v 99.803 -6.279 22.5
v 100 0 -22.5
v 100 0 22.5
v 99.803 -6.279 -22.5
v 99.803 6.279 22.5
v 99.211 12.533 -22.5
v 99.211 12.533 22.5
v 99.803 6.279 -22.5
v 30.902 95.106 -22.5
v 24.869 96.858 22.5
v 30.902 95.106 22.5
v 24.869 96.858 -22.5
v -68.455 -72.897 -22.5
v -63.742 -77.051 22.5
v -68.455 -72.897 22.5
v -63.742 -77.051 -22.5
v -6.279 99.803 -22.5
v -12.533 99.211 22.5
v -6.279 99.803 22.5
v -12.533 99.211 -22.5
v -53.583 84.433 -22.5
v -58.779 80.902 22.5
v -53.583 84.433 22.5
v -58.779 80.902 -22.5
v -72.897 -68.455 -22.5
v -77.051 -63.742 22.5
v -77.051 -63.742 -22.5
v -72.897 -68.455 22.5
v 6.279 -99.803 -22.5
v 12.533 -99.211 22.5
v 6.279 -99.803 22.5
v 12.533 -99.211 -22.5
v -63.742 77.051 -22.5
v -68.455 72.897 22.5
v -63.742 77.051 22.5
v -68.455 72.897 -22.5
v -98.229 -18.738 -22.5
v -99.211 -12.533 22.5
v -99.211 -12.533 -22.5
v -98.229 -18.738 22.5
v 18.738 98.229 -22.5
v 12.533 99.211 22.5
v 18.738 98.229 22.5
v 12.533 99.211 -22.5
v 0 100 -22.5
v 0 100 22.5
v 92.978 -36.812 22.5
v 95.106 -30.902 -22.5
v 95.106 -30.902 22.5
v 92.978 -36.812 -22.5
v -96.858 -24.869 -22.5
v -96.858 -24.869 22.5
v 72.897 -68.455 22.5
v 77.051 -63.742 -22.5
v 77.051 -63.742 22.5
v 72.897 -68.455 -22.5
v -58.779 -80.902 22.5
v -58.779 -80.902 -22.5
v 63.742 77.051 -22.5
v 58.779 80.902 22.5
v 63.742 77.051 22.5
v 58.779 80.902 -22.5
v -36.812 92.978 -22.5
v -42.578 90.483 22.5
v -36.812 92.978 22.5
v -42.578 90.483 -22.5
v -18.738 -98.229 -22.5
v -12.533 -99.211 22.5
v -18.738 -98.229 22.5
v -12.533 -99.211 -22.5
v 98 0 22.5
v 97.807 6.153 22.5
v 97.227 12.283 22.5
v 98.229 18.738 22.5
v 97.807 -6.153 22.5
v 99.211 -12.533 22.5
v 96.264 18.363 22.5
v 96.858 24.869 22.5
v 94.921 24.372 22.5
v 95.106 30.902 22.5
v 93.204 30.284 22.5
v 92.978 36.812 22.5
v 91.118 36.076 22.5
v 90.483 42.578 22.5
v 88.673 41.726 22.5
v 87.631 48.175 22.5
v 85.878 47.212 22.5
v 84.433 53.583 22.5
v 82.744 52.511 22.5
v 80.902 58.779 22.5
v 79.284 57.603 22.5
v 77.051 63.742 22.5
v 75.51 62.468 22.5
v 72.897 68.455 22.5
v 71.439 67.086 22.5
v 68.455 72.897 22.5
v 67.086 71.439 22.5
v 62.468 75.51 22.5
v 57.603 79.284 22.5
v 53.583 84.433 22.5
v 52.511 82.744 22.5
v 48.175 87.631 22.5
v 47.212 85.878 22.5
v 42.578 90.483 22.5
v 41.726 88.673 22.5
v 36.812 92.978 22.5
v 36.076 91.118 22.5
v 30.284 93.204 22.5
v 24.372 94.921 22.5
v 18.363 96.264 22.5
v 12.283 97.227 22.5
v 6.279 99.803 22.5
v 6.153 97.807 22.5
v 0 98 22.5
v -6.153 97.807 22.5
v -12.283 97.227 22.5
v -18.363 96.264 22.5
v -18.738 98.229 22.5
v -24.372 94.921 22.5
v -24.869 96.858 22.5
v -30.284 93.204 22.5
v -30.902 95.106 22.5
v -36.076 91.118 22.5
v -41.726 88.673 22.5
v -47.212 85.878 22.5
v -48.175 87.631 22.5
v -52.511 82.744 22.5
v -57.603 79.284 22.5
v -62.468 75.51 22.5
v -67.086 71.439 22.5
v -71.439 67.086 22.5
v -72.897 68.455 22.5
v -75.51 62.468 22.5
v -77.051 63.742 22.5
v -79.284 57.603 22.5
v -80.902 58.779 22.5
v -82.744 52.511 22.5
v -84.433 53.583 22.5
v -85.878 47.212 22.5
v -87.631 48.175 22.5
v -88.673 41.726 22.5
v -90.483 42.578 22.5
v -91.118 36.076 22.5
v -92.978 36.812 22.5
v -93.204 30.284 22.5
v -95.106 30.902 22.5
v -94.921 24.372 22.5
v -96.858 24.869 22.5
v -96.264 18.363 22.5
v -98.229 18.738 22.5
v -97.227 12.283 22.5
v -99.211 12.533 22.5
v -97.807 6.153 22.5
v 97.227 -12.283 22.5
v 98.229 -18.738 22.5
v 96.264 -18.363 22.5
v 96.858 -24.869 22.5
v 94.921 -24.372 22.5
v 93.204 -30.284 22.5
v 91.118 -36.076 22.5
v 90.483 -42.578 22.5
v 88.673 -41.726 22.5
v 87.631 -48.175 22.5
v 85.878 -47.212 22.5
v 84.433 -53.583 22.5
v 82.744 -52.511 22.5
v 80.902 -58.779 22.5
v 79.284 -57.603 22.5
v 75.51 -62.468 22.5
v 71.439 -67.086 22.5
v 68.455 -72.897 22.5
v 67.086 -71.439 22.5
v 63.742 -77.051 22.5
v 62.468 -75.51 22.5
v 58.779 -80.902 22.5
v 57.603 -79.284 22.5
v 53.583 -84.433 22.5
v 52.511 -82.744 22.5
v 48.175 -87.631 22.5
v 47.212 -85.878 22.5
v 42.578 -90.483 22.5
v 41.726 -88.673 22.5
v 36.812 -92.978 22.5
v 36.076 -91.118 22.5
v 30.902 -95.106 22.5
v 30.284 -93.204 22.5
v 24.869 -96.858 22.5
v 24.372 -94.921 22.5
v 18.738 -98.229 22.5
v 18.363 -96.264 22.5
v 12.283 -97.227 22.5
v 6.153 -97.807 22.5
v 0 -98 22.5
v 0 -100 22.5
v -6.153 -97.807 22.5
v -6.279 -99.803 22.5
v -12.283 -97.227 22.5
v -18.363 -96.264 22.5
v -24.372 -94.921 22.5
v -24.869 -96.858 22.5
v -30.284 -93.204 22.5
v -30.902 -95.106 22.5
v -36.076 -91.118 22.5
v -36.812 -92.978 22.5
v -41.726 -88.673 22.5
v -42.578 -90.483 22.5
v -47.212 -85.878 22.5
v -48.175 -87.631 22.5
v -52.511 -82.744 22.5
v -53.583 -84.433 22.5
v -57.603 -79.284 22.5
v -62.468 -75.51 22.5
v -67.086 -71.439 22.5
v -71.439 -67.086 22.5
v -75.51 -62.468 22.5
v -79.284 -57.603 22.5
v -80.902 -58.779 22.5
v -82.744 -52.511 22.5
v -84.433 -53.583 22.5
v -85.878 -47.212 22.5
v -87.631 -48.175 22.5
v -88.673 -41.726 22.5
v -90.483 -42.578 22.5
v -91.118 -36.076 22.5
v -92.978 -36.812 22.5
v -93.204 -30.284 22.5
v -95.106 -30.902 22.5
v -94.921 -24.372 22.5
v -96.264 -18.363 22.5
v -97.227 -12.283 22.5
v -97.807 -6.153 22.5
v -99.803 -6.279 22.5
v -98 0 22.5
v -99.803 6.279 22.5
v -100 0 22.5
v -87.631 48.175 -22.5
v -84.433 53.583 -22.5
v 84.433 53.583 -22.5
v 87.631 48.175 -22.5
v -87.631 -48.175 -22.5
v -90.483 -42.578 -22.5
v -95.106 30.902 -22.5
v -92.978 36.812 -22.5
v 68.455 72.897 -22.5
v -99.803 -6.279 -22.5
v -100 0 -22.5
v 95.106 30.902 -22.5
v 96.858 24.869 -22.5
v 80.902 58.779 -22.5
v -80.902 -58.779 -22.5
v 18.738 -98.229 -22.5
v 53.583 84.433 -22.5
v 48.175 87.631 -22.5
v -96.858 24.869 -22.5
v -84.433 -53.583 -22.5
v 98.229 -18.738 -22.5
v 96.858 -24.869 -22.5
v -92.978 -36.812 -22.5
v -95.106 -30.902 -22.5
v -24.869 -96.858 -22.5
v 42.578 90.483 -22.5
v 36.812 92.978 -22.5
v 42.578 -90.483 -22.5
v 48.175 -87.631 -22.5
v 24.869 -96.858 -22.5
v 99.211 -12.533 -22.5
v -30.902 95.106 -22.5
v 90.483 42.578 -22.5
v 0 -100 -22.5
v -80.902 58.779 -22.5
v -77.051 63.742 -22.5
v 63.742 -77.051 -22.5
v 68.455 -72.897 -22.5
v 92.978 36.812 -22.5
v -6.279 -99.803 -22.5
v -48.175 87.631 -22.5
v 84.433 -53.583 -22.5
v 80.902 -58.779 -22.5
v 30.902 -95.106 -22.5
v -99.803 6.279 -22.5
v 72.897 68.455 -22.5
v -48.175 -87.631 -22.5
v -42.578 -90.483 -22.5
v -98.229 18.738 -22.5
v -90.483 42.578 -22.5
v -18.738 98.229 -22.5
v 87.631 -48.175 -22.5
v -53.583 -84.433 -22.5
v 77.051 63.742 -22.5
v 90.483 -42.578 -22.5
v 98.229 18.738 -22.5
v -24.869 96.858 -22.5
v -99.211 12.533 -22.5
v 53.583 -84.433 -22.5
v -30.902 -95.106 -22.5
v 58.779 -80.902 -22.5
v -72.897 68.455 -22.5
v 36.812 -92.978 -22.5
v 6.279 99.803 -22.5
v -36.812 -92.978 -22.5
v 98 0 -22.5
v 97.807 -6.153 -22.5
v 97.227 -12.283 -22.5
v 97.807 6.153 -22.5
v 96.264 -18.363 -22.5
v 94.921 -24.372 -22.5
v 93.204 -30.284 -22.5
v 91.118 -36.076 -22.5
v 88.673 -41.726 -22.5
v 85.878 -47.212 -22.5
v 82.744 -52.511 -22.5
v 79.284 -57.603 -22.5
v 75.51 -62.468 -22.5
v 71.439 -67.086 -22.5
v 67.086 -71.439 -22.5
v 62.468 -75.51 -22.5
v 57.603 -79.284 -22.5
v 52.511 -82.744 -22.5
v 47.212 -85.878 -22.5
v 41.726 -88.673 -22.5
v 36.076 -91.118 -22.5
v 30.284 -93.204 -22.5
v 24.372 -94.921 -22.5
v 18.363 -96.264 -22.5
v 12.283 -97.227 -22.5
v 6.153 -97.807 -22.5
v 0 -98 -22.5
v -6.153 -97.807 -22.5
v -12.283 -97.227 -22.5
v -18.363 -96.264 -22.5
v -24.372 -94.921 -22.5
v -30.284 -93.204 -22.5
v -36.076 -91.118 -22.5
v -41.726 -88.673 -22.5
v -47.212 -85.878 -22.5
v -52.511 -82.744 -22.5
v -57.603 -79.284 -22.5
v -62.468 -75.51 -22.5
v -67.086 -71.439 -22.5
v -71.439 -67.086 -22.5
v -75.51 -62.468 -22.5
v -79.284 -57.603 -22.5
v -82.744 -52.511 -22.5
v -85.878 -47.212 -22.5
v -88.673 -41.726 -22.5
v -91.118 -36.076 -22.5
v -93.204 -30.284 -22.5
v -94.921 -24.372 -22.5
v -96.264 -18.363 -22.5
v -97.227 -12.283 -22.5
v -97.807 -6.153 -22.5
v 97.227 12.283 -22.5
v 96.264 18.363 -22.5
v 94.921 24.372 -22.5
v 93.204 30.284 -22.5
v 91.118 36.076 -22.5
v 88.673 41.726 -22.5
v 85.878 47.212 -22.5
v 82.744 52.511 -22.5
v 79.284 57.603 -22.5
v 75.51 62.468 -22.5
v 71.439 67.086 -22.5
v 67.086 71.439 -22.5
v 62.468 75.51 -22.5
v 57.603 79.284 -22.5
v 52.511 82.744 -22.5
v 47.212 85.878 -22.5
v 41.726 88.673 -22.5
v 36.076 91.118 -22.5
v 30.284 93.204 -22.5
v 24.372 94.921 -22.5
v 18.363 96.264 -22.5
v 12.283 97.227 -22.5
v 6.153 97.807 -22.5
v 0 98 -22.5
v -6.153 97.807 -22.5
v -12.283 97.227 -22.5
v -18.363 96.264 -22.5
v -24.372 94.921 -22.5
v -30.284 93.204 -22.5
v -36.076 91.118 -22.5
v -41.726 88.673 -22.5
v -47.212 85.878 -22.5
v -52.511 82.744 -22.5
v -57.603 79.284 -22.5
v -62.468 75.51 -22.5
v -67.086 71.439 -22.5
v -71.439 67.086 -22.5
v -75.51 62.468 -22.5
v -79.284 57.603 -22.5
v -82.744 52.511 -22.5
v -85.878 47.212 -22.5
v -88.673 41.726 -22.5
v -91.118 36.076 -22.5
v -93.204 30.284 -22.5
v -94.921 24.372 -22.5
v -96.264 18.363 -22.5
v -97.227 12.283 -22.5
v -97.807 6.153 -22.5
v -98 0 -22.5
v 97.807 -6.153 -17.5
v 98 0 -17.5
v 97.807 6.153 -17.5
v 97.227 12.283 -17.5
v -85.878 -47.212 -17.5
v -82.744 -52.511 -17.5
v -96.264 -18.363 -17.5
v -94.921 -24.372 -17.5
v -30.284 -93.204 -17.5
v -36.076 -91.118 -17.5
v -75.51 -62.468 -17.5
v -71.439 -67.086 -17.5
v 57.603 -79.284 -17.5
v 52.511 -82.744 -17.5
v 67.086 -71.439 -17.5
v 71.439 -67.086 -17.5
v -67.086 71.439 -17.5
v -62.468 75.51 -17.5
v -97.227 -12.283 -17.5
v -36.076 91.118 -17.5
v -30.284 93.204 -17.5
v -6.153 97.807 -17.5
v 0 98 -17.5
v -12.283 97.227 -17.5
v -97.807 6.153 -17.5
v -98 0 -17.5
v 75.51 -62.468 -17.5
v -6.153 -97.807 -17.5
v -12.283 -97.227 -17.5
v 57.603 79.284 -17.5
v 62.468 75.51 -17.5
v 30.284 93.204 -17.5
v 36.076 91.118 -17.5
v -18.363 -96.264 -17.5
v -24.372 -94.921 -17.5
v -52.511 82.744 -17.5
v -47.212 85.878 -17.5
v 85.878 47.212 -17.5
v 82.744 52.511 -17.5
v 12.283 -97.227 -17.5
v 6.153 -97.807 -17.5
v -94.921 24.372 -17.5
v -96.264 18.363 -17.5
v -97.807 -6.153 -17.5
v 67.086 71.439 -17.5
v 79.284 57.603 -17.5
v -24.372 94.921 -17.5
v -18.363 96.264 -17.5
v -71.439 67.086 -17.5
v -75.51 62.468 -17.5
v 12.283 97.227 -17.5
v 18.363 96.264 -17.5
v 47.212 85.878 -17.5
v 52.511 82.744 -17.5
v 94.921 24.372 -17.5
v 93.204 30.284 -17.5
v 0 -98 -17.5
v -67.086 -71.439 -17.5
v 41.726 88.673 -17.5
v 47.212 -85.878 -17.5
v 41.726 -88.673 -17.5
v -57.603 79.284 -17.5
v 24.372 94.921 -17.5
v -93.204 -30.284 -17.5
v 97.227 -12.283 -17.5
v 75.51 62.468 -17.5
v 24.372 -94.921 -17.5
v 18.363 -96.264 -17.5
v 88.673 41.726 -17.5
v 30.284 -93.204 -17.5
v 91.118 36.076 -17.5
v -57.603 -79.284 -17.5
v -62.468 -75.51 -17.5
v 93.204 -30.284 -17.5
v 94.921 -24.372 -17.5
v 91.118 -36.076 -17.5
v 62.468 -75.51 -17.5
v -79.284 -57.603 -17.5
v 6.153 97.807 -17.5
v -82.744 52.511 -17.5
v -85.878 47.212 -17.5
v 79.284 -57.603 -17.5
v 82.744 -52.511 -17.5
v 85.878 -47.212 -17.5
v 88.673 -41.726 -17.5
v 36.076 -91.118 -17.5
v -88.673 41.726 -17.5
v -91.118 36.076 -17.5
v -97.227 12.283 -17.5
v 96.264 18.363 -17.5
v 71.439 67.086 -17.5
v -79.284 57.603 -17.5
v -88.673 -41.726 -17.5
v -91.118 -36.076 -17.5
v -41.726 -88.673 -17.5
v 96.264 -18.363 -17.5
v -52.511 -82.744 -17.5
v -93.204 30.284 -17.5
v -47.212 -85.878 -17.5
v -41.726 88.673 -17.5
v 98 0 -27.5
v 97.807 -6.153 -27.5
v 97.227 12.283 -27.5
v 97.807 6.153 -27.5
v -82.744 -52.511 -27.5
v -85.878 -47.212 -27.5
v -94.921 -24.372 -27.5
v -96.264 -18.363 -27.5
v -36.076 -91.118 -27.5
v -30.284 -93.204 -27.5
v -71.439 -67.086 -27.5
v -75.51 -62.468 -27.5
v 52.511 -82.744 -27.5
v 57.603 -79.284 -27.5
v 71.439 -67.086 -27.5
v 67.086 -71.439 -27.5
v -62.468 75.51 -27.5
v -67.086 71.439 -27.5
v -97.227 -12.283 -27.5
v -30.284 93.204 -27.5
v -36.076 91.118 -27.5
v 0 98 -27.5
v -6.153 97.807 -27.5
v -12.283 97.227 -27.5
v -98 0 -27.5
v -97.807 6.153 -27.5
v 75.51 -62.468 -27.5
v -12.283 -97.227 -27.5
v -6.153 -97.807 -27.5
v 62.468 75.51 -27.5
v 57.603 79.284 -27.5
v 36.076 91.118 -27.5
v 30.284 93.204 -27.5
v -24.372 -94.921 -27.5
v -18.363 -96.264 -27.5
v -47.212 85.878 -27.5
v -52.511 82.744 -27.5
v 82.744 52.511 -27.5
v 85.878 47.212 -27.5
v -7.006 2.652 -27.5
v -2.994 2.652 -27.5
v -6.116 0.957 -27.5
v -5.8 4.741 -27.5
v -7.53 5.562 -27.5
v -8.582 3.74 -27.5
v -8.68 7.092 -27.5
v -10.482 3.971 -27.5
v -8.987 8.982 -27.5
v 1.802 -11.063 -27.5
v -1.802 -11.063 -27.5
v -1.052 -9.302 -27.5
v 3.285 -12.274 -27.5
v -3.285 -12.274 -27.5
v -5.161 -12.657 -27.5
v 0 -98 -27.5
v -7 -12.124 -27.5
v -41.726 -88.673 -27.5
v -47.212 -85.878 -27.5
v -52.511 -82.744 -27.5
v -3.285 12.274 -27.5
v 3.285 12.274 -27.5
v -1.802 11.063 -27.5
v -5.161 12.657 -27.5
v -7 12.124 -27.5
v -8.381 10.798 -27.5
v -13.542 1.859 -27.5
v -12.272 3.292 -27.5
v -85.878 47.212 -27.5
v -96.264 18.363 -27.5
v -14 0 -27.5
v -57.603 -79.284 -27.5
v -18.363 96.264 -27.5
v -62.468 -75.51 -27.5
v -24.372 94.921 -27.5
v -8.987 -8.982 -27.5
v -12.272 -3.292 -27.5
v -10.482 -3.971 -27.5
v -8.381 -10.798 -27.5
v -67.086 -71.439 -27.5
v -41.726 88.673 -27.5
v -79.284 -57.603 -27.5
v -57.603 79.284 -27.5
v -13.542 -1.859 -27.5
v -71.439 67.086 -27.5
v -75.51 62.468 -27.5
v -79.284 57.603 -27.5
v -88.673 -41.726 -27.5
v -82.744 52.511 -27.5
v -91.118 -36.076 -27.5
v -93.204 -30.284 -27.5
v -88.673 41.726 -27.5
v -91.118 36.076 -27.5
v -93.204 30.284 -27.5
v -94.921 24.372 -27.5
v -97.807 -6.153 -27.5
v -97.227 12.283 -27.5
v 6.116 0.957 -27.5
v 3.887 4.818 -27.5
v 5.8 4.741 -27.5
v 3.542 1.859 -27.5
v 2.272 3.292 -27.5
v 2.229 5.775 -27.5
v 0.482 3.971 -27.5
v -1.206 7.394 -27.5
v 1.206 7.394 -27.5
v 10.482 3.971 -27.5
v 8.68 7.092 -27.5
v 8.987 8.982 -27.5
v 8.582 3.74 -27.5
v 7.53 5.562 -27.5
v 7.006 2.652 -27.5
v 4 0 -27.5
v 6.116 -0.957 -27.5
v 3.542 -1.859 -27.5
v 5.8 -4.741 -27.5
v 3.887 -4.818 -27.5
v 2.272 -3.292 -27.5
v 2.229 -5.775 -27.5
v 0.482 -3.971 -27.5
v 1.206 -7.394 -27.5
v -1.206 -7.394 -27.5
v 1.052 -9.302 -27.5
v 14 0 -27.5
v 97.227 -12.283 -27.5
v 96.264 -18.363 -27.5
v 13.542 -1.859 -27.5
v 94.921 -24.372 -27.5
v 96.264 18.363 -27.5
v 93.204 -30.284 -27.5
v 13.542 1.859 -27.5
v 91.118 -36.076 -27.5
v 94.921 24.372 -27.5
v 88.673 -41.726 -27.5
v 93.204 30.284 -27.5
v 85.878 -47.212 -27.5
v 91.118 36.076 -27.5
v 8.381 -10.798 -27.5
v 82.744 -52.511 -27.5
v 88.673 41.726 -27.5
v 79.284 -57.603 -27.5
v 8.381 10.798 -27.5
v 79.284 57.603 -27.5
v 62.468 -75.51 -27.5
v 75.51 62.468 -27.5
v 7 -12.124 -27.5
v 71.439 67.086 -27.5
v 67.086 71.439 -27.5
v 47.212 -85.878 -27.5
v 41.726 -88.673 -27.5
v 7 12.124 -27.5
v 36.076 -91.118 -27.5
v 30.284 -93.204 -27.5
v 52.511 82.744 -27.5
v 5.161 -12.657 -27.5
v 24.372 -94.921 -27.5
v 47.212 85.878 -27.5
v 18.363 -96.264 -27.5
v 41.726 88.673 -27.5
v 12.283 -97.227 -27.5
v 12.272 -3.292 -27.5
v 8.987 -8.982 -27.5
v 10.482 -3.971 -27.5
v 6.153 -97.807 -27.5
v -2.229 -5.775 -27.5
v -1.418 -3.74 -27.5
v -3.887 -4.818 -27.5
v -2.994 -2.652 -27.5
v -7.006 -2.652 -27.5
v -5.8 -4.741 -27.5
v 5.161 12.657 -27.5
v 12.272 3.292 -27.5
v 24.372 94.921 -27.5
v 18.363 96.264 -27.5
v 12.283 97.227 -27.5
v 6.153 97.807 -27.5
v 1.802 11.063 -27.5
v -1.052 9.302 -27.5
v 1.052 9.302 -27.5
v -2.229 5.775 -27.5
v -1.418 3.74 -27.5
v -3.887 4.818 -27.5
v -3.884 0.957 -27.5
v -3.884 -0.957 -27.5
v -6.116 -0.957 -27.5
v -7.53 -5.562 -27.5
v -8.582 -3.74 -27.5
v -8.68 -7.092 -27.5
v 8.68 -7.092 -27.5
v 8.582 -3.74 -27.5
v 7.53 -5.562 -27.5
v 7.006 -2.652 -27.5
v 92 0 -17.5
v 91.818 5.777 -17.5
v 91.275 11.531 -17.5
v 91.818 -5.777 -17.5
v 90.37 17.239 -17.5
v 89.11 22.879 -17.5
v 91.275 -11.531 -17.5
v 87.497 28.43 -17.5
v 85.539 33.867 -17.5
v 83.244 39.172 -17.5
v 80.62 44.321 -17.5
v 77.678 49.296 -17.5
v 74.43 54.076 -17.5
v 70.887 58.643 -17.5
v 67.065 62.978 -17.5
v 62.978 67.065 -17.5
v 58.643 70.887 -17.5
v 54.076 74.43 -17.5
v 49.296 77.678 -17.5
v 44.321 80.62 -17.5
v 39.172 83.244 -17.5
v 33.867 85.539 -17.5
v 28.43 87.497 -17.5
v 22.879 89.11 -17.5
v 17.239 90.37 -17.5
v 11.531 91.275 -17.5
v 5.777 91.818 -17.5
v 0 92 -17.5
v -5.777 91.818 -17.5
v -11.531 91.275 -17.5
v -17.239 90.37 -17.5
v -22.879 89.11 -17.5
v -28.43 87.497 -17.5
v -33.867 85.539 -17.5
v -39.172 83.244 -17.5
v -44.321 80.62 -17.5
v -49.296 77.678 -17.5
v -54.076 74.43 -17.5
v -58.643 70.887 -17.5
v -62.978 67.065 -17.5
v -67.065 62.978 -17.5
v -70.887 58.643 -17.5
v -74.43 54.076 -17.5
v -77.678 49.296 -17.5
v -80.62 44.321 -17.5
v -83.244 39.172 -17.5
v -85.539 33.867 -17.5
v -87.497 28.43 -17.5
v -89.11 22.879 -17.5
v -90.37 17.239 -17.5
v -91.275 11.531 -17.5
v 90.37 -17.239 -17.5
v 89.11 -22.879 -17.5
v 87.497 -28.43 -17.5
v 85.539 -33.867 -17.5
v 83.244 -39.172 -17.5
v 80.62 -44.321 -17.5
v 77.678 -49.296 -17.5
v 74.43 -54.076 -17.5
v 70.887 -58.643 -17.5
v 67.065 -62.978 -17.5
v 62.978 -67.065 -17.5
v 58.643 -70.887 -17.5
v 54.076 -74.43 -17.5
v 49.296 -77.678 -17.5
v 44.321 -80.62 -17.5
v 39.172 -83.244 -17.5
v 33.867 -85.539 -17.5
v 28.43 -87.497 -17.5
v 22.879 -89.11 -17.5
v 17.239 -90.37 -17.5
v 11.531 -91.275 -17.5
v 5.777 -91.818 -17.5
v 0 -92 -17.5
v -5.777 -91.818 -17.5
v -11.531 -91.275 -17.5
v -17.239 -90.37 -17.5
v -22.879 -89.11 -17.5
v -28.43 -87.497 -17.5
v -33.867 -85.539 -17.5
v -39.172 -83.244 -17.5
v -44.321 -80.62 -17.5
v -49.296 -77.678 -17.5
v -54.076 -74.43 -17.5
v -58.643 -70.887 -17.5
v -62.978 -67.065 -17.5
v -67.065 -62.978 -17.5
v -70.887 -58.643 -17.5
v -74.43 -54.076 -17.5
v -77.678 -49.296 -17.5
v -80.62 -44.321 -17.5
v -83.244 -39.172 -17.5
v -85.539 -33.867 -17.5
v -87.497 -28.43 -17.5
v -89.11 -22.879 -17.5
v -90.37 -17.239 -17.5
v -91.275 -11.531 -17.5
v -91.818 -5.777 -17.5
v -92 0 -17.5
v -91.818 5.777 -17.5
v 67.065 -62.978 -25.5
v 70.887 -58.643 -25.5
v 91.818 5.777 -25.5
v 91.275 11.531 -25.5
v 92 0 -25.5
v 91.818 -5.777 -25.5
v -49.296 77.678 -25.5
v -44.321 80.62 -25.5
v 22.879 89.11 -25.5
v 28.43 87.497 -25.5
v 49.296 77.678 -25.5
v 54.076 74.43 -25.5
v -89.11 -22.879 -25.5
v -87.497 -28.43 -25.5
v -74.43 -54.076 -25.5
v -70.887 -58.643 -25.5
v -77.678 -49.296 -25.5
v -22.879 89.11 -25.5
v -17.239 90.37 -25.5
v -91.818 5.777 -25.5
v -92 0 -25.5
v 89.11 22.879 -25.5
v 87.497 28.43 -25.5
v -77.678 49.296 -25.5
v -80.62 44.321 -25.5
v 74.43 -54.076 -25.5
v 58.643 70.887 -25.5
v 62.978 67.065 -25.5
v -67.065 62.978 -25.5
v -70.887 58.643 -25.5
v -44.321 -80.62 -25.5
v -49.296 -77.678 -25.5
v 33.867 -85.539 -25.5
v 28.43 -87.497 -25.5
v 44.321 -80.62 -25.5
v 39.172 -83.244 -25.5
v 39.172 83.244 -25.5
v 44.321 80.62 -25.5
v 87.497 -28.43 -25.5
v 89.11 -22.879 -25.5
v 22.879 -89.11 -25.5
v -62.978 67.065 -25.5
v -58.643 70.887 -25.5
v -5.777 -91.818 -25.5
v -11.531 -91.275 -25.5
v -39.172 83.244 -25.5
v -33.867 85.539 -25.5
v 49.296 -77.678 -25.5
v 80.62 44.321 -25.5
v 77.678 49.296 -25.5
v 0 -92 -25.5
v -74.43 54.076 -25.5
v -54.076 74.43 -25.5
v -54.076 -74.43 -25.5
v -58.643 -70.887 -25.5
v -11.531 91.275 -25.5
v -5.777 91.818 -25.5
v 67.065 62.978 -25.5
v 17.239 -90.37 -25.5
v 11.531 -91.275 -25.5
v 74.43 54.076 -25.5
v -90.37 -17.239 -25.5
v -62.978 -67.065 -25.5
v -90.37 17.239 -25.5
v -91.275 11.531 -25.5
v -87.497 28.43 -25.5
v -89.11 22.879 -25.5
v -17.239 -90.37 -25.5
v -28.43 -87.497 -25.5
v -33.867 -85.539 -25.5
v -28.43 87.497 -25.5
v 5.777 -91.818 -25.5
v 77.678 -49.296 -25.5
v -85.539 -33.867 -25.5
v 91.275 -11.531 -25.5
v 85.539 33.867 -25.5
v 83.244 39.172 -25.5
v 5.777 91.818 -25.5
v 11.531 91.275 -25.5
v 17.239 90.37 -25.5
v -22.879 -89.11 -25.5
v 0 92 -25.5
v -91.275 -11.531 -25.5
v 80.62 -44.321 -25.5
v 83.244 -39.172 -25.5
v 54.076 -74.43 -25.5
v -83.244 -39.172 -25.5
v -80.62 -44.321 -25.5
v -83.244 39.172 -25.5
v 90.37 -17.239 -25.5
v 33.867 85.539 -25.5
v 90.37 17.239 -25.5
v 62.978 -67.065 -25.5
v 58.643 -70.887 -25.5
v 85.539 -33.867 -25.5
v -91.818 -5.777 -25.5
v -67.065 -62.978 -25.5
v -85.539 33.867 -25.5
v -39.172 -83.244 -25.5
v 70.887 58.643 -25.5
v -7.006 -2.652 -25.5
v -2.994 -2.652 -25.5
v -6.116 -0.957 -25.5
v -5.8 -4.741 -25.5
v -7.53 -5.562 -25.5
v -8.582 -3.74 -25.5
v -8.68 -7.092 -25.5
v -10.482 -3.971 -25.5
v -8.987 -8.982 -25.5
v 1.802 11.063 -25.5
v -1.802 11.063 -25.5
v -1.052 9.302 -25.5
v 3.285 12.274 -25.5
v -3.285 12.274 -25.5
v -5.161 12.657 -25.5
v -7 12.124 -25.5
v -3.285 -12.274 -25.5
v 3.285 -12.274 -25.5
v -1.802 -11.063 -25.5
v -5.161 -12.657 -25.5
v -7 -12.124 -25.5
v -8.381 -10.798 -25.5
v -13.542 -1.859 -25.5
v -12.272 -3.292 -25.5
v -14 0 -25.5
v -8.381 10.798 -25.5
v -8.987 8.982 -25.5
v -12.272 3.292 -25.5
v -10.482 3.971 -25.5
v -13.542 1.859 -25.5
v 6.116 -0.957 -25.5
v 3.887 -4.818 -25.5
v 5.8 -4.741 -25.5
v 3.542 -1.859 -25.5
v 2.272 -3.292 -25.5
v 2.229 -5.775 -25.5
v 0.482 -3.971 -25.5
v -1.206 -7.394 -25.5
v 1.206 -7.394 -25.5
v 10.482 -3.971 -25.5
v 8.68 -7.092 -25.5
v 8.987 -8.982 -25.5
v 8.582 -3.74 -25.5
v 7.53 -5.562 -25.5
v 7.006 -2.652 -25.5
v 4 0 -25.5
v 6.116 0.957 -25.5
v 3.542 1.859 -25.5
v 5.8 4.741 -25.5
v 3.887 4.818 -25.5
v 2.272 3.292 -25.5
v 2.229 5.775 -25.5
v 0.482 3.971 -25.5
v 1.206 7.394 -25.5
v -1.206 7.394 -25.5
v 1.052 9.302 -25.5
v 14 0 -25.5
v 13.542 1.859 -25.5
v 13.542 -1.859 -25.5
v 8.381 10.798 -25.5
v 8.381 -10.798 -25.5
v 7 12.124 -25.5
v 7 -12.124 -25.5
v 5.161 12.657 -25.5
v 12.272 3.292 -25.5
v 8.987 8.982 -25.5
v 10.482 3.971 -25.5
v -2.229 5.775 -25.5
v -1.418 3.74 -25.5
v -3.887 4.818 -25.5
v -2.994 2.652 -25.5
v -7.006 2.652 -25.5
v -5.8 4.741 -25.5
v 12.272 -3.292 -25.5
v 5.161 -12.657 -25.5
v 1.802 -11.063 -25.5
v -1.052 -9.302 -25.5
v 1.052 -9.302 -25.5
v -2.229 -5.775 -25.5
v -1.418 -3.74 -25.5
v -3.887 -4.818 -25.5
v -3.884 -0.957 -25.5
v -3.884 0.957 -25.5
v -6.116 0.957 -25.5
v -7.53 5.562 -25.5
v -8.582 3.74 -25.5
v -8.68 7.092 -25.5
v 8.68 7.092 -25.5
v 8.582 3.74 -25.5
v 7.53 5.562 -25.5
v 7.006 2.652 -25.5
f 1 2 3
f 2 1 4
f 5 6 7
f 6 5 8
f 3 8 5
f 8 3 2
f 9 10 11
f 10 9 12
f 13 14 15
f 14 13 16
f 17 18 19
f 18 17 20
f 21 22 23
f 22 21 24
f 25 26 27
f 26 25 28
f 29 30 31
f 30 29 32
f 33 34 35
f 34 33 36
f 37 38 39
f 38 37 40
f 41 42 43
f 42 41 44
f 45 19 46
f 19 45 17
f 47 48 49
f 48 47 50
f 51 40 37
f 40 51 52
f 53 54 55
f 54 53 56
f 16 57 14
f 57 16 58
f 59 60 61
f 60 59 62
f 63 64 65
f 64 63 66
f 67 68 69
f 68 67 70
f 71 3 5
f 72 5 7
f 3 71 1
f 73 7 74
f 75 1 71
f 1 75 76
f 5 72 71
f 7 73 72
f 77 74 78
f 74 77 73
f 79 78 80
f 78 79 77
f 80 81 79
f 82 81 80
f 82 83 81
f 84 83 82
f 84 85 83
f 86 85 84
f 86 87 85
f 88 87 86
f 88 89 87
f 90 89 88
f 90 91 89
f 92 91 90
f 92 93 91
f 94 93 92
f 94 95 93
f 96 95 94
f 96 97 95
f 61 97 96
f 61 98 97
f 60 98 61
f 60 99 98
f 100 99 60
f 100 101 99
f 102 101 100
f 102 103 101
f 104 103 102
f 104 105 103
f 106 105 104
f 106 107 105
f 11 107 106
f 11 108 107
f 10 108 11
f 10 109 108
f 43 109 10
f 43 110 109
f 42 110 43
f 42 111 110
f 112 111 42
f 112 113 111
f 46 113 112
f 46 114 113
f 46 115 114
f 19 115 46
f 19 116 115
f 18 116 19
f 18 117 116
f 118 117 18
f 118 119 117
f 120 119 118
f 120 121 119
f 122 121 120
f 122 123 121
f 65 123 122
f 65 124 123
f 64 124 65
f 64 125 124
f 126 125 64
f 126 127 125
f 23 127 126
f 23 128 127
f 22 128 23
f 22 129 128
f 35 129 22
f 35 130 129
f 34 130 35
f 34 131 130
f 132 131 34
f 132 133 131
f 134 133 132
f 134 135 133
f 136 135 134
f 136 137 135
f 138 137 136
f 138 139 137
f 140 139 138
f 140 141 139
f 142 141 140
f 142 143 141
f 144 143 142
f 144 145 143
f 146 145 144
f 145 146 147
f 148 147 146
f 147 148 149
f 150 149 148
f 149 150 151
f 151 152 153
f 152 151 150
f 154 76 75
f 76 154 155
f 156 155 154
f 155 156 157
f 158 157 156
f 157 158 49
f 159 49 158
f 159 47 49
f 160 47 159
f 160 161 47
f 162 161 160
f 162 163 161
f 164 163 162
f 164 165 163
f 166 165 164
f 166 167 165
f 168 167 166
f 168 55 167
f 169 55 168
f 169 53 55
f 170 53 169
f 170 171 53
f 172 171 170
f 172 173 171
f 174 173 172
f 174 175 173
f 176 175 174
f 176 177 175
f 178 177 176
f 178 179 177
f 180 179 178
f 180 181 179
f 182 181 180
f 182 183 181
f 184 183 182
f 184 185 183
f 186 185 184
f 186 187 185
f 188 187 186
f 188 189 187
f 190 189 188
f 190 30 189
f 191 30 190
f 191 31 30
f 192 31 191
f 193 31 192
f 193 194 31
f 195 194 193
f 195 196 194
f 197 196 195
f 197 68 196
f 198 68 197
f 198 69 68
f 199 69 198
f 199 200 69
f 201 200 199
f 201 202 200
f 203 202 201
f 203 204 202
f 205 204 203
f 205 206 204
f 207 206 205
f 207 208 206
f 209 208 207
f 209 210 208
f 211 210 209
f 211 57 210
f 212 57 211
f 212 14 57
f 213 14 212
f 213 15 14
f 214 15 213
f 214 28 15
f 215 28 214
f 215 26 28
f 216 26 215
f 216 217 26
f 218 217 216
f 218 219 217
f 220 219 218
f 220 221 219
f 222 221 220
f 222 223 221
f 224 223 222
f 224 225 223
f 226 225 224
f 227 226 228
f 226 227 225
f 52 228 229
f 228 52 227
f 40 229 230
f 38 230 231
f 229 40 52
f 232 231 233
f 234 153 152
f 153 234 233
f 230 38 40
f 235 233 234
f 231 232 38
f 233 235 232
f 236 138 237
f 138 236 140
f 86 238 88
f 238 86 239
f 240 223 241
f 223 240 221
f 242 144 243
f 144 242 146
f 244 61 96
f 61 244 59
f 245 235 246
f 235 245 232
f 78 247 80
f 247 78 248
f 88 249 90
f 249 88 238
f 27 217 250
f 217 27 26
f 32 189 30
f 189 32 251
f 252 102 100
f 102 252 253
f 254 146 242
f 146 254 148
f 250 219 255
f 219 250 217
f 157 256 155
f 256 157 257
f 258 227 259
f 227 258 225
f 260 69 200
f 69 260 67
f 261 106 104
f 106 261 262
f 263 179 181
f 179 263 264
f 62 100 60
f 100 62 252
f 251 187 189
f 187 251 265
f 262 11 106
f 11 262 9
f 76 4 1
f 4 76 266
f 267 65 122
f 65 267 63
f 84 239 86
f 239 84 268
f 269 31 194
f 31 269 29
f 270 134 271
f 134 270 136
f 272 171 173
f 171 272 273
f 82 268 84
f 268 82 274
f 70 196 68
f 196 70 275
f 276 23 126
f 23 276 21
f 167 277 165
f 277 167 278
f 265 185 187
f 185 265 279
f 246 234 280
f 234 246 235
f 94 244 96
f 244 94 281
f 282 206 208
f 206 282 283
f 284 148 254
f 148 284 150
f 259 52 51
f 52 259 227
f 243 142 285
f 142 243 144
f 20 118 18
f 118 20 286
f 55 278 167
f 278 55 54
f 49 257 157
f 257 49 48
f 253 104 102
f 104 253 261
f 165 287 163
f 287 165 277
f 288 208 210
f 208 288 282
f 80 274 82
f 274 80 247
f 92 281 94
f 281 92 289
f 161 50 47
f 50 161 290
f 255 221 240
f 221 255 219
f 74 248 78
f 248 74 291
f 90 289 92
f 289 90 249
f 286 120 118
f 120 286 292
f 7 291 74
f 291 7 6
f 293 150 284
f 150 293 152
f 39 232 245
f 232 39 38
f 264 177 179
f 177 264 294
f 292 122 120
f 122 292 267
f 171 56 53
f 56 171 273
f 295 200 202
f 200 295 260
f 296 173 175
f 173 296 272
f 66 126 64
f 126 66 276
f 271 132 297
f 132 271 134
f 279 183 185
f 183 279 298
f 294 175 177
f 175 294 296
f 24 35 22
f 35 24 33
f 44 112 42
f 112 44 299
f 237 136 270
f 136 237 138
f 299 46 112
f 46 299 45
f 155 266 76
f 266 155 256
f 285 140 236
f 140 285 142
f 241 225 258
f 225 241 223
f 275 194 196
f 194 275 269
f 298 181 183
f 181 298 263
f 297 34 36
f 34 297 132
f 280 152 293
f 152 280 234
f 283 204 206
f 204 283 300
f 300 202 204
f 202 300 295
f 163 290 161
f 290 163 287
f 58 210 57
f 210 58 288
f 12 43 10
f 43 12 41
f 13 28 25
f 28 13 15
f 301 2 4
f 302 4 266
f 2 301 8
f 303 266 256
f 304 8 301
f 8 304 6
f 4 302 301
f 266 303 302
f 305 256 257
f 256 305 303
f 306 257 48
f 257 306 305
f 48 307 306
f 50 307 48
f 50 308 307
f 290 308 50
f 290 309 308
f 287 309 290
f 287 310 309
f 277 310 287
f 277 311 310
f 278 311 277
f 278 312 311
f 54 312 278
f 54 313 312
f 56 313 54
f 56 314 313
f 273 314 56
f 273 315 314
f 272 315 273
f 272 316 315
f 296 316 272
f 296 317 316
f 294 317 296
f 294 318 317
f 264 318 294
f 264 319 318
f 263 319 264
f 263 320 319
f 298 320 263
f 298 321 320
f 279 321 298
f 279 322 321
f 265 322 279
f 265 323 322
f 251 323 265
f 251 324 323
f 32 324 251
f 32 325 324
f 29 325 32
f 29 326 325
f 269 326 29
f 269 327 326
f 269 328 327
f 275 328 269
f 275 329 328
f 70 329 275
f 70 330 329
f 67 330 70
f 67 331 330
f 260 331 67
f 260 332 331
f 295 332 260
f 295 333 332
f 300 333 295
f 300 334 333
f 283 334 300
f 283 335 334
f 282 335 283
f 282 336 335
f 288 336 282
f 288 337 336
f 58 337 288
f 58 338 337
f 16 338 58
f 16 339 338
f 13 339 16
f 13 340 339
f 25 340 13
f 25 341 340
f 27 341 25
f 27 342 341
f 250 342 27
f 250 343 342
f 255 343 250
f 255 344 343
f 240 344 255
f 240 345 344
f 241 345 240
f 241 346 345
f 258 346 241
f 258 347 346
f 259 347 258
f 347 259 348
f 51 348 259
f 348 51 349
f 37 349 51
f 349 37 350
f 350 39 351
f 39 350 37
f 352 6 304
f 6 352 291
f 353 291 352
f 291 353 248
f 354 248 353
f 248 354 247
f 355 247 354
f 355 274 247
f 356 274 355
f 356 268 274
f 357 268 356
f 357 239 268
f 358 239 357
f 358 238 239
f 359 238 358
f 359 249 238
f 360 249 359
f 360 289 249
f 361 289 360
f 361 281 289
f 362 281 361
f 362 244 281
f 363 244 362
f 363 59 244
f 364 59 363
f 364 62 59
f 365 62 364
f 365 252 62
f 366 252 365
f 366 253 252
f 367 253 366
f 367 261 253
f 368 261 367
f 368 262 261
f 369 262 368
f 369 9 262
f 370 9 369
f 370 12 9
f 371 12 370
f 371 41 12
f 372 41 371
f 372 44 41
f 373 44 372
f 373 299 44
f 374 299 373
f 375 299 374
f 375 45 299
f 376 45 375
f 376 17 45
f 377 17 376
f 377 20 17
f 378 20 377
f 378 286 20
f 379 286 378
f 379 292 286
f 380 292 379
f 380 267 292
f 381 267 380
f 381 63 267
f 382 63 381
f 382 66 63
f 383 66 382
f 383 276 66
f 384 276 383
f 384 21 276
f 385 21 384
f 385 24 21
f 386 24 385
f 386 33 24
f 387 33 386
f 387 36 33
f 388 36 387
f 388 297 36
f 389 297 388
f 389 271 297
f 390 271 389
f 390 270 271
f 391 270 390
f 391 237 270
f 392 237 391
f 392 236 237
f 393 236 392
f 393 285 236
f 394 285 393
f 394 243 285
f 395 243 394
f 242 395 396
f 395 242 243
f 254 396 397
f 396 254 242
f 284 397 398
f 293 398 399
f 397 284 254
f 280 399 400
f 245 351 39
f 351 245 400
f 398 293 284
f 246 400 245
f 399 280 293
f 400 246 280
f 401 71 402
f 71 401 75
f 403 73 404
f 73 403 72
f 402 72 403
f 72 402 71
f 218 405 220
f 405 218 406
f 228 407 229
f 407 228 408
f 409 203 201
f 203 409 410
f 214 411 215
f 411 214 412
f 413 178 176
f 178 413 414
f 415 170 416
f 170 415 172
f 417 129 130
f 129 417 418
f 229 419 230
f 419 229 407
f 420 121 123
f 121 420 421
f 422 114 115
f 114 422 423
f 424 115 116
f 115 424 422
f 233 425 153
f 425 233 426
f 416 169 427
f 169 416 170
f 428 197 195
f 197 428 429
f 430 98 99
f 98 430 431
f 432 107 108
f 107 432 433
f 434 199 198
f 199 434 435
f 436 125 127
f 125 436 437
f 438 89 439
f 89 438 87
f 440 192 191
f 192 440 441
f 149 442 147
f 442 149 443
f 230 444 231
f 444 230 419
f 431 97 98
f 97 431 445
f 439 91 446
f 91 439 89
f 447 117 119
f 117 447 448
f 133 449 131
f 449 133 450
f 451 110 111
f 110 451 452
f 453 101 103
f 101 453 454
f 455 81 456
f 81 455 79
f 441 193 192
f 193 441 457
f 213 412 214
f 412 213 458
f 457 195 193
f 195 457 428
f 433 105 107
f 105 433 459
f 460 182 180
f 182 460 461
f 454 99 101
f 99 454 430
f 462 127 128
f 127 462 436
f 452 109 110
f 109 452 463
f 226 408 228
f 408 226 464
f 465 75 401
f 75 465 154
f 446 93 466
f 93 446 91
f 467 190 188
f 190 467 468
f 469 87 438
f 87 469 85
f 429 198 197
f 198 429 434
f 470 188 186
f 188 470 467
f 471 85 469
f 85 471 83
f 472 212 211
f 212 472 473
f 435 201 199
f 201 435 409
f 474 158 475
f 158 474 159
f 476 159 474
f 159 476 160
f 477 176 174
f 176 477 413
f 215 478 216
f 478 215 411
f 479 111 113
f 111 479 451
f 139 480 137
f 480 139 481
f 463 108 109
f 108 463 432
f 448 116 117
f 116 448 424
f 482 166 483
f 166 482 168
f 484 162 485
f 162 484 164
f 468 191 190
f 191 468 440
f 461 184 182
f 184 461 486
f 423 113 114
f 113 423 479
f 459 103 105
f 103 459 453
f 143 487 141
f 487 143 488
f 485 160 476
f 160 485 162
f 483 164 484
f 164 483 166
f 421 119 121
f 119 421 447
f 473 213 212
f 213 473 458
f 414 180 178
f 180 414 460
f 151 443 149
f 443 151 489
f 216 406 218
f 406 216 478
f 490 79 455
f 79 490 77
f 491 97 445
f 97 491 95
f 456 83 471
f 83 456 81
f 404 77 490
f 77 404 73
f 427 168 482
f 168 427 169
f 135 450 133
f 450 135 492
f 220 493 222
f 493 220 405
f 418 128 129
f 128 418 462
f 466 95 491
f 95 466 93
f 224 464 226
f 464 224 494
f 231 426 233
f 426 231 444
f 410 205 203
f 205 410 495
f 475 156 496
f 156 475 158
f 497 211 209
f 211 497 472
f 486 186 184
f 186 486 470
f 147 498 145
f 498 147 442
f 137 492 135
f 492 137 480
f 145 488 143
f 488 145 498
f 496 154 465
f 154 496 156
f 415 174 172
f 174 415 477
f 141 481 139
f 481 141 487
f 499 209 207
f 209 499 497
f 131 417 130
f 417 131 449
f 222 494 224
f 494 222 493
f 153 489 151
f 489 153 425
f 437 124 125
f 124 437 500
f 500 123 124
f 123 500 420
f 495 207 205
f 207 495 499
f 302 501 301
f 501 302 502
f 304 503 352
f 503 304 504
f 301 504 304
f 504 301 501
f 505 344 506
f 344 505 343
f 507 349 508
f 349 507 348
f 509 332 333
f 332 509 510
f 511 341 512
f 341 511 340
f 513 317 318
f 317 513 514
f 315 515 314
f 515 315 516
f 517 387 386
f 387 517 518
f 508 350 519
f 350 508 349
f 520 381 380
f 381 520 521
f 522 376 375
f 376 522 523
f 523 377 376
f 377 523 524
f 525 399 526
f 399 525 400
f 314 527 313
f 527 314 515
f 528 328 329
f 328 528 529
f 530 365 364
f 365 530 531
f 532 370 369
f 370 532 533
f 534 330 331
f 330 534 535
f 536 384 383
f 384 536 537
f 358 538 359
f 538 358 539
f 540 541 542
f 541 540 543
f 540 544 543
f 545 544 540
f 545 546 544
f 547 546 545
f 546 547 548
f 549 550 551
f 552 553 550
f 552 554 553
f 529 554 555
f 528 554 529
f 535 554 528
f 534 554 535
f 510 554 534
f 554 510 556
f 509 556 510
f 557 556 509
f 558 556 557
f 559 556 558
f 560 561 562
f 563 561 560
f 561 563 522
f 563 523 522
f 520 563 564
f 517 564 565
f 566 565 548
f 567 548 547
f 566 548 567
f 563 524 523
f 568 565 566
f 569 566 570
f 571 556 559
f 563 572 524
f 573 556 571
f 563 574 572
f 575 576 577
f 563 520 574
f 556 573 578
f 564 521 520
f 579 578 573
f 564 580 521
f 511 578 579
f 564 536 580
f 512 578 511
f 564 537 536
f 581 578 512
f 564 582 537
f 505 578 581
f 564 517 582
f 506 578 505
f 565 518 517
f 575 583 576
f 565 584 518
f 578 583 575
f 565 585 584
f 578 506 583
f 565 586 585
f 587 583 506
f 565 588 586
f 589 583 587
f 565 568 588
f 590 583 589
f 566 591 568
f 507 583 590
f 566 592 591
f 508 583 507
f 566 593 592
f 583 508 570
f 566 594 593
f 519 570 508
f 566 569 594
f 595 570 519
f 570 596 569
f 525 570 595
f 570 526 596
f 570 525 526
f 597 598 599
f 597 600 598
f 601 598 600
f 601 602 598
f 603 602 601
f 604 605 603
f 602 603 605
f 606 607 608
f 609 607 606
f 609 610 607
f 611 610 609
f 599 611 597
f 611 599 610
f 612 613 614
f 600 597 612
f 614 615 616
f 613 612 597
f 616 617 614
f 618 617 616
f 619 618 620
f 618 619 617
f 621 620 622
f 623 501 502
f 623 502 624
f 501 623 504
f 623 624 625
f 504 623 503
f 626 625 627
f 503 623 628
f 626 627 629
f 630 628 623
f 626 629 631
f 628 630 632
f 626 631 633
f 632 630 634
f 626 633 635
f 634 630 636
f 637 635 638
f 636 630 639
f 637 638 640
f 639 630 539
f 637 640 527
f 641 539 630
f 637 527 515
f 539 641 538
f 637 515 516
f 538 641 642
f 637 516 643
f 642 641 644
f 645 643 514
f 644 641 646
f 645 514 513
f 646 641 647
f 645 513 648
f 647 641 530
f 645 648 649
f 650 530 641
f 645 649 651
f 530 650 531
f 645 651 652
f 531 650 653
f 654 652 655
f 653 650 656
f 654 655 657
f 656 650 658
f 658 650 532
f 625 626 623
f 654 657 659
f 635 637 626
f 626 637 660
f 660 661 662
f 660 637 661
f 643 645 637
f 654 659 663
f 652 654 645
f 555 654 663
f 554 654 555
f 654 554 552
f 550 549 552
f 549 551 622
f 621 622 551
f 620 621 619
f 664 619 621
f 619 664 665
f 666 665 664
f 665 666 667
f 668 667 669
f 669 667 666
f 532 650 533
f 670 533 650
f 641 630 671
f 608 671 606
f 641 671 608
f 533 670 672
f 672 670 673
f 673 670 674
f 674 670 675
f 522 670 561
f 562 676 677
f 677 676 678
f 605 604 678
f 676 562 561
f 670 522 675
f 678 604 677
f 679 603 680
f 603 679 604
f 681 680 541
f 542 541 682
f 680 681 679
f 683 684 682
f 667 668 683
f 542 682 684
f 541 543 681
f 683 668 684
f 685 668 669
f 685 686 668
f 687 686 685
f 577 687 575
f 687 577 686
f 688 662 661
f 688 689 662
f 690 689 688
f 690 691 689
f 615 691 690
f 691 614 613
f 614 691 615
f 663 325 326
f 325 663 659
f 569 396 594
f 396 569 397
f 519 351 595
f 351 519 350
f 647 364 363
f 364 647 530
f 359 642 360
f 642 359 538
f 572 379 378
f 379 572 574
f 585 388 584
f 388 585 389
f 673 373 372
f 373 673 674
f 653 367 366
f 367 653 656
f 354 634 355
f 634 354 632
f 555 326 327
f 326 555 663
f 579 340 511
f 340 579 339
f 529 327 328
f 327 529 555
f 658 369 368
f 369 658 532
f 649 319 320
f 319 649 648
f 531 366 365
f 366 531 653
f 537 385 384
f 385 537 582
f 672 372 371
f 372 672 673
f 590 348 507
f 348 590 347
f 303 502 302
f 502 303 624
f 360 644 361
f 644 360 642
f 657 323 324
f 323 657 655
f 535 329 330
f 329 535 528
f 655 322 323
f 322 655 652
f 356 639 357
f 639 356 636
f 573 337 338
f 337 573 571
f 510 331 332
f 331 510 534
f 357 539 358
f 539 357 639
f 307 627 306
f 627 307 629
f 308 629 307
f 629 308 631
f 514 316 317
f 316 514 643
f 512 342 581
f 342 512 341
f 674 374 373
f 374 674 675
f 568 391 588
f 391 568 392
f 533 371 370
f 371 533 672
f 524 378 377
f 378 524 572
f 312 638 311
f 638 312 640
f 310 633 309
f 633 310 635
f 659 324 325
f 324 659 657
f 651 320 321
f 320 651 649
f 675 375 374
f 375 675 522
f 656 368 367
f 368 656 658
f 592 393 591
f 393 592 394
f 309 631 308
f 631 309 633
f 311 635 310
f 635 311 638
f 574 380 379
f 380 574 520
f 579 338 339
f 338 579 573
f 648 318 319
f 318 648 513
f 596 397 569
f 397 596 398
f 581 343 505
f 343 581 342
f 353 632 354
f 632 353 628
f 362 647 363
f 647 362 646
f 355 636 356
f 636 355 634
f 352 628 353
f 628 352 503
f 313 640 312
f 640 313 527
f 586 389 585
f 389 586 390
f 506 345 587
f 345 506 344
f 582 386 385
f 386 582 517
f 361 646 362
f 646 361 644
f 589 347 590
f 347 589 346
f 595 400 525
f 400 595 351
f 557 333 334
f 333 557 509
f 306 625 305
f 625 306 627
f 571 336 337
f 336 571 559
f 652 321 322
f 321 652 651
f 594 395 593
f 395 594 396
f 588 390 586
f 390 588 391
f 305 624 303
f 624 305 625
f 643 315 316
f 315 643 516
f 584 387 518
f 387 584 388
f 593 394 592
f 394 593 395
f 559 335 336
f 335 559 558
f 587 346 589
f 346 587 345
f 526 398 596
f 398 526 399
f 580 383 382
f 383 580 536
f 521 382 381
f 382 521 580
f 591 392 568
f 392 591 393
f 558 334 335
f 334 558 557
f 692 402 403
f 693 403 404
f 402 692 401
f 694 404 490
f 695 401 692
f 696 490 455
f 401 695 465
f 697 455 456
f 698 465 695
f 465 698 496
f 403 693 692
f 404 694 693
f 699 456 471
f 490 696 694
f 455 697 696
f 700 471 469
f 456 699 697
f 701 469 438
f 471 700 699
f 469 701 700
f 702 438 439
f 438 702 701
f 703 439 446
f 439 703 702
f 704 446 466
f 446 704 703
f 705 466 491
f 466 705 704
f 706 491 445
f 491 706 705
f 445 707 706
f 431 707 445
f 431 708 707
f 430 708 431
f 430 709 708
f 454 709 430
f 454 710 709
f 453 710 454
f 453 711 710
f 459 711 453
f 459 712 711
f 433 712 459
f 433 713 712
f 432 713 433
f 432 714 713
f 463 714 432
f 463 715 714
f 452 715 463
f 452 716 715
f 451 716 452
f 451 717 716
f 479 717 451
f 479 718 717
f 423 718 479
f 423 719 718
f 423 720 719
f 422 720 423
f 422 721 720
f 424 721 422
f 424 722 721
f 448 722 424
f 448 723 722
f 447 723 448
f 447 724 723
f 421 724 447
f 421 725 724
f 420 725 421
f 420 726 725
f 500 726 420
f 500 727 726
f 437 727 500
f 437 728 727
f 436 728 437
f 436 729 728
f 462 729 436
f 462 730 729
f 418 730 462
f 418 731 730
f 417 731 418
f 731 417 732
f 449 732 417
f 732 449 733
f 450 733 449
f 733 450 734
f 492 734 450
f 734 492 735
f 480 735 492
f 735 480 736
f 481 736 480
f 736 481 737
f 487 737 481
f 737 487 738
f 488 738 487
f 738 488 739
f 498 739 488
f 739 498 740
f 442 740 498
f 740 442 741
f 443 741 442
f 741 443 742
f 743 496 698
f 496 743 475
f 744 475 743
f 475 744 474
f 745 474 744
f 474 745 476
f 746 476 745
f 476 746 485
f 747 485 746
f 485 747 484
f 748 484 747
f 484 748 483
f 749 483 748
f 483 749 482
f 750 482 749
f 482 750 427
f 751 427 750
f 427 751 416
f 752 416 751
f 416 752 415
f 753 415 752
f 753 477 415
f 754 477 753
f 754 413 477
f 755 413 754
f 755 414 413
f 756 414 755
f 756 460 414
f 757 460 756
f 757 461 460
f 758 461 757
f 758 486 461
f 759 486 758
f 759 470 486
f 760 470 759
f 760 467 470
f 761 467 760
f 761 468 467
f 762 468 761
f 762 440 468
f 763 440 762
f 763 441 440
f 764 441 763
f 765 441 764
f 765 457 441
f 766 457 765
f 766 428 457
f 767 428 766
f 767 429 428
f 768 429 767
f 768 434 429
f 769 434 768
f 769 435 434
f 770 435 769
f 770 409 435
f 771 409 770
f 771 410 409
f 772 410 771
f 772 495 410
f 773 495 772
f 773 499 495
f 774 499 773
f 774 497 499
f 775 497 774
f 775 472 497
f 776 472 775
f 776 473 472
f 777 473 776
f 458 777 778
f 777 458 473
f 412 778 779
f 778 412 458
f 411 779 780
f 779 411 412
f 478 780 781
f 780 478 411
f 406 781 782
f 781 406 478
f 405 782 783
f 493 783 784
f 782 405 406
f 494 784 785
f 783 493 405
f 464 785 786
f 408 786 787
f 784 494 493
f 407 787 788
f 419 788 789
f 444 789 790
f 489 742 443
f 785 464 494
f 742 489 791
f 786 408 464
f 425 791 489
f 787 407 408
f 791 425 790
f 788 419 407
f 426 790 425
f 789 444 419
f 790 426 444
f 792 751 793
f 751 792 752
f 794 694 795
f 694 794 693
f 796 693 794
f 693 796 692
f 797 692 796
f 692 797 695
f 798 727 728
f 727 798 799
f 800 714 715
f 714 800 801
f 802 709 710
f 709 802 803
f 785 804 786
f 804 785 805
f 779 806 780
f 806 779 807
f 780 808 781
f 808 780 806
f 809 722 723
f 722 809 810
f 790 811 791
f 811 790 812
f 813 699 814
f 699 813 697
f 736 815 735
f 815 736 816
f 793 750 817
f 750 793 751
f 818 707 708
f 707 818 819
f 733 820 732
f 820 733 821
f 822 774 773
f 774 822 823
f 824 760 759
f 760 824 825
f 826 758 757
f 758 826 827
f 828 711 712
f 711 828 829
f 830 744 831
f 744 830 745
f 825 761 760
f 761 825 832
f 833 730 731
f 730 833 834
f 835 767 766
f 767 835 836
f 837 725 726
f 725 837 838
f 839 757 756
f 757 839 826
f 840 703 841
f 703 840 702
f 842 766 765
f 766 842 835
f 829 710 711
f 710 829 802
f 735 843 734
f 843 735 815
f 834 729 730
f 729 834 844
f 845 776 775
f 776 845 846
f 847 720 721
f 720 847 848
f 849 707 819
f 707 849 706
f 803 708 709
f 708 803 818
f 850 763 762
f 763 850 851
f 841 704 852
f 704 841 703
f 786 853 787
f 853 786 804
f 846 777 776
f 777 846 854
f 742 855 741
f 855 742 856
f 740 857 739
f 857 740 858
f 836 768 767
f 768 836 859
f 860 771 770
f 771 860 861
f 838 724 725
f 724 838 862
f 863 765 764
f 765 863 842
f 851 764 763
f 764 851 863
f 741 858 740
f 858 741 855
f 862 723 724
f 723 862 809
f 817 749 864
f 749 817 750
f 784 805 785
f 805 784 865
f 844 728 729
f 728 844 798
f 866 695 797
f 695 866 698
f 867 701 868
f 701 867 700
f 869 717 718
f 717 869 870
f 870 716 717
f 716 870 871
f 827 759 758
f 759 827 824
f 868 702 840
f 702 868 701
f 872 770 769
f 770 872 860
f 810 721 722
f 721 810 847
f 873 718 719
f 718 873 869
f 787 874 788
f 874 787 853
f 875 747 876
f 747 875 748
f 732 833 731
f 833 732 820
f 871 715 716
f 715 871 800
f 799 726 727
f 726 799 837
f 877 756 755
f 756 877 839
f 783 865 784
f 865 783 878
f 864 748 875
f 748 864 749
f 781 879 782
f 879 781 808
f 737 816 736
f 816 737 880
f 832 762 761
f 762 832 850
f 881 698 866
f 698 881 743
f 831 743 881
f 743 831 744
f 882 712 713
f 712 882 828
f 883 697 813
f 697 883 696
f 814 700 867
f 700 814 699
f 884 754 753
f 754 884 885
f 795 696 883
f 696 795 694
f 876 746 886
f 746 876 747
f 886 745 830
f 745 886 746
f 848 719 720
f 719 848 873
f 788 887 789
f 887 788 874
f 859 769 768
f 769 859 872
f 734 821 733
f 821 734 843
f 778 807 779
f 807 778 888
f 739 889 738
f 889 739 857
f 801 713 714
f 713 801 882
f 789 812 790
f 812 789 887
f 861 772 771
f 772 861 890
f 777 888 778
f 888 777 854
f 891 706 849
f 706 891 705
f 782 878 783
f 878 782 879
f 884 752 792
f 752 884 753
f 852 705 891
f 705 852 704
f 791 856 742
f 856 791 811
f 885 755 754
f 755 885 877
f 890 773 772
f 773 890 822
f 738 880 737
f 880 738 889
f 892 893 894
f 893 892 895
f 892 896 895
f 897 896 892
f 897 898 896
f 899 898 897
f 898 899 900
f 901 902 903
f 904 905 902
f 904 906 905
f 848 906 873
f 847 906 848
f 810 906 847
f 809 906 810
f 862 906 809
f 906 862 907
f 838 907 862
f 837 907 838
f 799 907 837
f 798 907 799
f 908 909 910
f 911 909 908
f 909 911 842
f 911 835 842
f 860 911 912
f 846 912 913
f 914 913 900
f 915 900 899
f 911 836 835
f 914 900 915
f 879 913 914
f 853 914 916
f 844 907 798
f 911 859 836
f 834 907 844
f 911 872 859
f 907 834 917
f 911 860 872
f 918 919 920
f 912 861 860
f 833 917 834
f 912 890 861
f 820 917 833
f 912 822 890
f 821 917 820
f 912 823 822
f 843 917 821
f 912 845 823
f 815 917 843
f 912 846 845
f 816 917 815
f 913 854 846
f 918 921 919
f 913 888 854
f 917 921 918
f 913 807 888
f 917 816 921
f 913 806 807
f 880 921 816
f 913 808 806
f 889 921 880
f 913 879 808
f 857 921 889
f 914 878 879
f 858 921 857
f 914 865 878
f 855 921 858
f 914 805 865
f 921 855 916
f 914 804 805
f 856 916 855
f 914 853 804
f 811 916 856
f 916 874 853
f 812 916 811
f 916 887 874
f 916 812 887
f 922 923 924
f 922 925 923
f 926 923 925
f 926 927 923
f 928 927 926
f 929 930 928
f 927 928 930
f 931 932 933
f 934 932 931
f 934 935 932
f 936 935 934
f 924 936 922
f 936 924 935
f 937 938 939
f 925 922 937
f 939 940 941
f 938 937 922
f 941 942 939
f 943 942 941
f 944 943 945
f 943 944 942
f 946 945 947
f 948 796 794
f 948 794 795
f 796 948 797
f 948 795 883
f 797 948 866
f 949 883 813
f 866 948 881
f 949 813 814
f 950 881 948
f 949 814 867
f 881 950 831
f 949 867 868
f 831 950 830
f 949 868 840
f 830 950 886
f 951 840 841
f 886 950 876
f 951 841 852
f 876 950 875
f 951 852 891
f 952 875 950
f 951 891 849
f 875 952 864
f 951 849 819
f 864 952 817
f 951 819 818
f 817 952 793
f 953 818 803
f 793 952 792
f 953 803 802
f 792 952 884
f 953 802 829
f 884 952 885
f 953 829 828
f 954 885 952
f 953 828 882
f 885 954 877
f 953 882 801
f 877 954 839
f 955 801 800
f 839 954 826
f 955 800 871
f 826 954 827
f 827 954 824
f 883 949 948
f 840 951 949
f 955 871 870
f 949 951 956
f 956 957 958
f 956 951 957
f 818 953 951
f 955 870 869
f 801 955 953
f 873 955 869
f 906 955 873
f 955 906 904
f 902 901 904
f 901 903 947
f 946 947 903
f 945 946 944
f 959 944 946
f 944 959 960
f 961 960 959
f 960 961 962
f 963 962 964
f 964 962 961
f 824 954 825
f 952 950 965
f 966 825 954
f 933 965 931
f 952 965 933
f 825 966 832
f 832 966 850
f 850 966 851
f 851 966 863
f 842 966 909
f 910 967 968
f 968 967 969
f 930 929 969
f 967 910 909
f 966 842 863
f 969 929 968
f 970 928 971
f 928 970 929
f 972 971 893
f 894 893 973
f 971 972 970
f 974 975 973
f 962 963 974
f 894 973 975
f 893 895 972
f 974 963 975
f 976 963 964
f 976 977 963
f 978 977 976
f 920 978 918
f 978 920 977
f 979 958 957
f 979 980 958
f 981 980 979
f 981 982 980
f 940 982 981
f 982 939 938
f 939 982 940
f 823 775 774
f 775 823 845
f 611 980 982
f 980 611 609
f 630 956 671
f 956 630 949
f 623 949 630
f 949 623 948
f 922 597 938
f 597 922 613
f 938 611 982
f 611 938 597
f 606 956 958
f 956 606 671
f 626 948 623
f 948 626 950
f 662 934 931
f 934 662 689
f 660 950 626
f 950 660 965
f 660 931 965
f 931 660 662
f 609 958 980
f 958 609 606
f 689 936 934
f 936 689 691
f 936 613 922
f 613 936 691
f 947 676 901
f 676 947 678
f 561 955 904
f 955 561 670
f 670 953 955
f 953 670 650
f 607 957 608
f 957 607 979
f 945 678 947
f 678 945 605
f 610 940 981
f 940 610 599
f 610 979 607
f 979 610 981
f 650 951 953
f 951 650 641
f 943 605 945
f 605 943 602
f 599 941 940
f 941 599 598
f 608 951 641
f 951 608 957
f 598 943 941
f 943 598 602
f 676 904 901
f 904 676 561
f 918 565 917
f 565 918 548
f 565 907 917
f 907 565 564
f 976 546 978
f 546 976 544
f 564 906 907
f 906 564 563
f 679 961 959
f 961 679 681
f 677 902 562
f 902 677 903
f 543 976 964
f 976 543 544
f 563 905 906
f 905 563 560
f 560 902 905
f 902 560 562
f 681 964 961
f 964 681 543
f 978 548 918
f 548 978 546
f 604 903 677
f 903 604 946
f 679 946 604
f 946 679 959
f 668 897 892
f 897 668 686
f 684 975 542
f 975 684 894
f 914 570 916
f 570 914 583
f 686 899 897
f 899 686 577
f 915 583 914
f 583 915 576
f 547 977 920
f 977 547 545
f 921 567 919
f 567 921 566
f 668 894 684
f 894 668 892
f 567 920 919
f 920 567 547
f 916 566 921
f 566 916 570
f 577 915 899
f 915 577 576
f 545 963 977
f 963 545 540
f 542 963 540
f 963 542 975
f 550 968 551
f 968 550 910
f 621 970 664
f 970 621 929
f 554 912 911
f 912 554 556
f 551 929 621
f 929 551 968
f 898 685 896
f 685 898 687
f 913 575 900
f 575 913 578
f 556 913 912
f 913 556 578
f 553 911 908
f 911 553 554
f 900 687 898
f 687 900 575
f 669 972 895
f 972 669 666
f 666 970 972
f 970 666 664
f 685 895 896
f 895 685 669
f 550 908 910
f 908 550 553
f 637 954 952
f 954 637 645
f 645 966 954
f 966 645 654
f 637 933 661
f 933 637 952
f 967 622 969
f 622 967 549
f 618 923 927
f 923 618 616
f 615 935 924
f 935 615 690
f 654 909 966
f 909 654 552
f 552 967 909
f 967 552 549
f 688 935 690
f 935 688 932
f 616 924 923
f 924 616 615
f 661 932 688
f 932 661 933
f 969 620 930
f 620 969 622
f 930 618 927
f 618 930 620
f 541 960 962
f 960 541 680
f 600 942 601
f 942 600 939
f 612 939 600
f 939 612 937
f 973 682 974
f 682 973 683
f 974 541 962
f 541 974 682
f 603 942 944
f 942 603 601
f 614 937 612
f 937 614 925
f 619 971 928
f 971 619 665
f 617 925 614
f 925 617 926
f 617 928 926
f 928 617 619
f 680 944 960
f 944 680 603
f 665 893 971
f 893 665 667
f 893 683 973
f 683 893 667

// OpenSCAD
// file: parameters.scad
$radius = 100;
$height = 50;

$margin = 2;

// Translates to $fn in `cylinder(...)`
$roundness = 100;

$connection = 5;

$hole_dia = 4;
// main file
include <parameters.scad>

module planter() {
  union() {
    difference() {
      difference() {
        union() {
          // Top part of planter
          color("lime") difference() {
            cylinder(h = $height - $connection, r = $radius, $fn = $roundness,
                     center = true);

            // DIFF
            translate([ 0, 0, $margin ])
                cylinder(h = $height, r = $radius - $margin, center = true,
                         $fn = $roundness);
          }

          // Bottom connector
          color("tomato") translate([ 0, 0, -($height / 2) ]) {
            union() {
              // Connector part
              cylinder(h = $connection, r = $radius - $margin, $fn = $roundness,
                       center = true);

              // Connecting bit to outer shell
              translate([ 0, 0, $connection ])
                  cylinder(h = $connection, r = $radius - .1, $fn = $roundness,
                           center = true);
            }
          }
        }
        // DIFF
        translate([ 0, 0, -$height / 2 + $margin * 2 ])
            cylinder(h = $connection + $margin * 2, r = $radius - $margin * 4,
                     $fn = $roundness, center = true);
      }

      // Drainage holes
      translate([ 0, 0, -$height ]) cylinder($height, $hole_dia, $hole_dia);
      for (i = [0:5]) {
        rotate([ 0, 0, 360 / 6 * i ])
            translate([ $hole_dia * 2 + $margin, 0, -$height ])
                cylinder($height, $hole_dia, $hole_dia);
      }
    }
  }
}
planter();
